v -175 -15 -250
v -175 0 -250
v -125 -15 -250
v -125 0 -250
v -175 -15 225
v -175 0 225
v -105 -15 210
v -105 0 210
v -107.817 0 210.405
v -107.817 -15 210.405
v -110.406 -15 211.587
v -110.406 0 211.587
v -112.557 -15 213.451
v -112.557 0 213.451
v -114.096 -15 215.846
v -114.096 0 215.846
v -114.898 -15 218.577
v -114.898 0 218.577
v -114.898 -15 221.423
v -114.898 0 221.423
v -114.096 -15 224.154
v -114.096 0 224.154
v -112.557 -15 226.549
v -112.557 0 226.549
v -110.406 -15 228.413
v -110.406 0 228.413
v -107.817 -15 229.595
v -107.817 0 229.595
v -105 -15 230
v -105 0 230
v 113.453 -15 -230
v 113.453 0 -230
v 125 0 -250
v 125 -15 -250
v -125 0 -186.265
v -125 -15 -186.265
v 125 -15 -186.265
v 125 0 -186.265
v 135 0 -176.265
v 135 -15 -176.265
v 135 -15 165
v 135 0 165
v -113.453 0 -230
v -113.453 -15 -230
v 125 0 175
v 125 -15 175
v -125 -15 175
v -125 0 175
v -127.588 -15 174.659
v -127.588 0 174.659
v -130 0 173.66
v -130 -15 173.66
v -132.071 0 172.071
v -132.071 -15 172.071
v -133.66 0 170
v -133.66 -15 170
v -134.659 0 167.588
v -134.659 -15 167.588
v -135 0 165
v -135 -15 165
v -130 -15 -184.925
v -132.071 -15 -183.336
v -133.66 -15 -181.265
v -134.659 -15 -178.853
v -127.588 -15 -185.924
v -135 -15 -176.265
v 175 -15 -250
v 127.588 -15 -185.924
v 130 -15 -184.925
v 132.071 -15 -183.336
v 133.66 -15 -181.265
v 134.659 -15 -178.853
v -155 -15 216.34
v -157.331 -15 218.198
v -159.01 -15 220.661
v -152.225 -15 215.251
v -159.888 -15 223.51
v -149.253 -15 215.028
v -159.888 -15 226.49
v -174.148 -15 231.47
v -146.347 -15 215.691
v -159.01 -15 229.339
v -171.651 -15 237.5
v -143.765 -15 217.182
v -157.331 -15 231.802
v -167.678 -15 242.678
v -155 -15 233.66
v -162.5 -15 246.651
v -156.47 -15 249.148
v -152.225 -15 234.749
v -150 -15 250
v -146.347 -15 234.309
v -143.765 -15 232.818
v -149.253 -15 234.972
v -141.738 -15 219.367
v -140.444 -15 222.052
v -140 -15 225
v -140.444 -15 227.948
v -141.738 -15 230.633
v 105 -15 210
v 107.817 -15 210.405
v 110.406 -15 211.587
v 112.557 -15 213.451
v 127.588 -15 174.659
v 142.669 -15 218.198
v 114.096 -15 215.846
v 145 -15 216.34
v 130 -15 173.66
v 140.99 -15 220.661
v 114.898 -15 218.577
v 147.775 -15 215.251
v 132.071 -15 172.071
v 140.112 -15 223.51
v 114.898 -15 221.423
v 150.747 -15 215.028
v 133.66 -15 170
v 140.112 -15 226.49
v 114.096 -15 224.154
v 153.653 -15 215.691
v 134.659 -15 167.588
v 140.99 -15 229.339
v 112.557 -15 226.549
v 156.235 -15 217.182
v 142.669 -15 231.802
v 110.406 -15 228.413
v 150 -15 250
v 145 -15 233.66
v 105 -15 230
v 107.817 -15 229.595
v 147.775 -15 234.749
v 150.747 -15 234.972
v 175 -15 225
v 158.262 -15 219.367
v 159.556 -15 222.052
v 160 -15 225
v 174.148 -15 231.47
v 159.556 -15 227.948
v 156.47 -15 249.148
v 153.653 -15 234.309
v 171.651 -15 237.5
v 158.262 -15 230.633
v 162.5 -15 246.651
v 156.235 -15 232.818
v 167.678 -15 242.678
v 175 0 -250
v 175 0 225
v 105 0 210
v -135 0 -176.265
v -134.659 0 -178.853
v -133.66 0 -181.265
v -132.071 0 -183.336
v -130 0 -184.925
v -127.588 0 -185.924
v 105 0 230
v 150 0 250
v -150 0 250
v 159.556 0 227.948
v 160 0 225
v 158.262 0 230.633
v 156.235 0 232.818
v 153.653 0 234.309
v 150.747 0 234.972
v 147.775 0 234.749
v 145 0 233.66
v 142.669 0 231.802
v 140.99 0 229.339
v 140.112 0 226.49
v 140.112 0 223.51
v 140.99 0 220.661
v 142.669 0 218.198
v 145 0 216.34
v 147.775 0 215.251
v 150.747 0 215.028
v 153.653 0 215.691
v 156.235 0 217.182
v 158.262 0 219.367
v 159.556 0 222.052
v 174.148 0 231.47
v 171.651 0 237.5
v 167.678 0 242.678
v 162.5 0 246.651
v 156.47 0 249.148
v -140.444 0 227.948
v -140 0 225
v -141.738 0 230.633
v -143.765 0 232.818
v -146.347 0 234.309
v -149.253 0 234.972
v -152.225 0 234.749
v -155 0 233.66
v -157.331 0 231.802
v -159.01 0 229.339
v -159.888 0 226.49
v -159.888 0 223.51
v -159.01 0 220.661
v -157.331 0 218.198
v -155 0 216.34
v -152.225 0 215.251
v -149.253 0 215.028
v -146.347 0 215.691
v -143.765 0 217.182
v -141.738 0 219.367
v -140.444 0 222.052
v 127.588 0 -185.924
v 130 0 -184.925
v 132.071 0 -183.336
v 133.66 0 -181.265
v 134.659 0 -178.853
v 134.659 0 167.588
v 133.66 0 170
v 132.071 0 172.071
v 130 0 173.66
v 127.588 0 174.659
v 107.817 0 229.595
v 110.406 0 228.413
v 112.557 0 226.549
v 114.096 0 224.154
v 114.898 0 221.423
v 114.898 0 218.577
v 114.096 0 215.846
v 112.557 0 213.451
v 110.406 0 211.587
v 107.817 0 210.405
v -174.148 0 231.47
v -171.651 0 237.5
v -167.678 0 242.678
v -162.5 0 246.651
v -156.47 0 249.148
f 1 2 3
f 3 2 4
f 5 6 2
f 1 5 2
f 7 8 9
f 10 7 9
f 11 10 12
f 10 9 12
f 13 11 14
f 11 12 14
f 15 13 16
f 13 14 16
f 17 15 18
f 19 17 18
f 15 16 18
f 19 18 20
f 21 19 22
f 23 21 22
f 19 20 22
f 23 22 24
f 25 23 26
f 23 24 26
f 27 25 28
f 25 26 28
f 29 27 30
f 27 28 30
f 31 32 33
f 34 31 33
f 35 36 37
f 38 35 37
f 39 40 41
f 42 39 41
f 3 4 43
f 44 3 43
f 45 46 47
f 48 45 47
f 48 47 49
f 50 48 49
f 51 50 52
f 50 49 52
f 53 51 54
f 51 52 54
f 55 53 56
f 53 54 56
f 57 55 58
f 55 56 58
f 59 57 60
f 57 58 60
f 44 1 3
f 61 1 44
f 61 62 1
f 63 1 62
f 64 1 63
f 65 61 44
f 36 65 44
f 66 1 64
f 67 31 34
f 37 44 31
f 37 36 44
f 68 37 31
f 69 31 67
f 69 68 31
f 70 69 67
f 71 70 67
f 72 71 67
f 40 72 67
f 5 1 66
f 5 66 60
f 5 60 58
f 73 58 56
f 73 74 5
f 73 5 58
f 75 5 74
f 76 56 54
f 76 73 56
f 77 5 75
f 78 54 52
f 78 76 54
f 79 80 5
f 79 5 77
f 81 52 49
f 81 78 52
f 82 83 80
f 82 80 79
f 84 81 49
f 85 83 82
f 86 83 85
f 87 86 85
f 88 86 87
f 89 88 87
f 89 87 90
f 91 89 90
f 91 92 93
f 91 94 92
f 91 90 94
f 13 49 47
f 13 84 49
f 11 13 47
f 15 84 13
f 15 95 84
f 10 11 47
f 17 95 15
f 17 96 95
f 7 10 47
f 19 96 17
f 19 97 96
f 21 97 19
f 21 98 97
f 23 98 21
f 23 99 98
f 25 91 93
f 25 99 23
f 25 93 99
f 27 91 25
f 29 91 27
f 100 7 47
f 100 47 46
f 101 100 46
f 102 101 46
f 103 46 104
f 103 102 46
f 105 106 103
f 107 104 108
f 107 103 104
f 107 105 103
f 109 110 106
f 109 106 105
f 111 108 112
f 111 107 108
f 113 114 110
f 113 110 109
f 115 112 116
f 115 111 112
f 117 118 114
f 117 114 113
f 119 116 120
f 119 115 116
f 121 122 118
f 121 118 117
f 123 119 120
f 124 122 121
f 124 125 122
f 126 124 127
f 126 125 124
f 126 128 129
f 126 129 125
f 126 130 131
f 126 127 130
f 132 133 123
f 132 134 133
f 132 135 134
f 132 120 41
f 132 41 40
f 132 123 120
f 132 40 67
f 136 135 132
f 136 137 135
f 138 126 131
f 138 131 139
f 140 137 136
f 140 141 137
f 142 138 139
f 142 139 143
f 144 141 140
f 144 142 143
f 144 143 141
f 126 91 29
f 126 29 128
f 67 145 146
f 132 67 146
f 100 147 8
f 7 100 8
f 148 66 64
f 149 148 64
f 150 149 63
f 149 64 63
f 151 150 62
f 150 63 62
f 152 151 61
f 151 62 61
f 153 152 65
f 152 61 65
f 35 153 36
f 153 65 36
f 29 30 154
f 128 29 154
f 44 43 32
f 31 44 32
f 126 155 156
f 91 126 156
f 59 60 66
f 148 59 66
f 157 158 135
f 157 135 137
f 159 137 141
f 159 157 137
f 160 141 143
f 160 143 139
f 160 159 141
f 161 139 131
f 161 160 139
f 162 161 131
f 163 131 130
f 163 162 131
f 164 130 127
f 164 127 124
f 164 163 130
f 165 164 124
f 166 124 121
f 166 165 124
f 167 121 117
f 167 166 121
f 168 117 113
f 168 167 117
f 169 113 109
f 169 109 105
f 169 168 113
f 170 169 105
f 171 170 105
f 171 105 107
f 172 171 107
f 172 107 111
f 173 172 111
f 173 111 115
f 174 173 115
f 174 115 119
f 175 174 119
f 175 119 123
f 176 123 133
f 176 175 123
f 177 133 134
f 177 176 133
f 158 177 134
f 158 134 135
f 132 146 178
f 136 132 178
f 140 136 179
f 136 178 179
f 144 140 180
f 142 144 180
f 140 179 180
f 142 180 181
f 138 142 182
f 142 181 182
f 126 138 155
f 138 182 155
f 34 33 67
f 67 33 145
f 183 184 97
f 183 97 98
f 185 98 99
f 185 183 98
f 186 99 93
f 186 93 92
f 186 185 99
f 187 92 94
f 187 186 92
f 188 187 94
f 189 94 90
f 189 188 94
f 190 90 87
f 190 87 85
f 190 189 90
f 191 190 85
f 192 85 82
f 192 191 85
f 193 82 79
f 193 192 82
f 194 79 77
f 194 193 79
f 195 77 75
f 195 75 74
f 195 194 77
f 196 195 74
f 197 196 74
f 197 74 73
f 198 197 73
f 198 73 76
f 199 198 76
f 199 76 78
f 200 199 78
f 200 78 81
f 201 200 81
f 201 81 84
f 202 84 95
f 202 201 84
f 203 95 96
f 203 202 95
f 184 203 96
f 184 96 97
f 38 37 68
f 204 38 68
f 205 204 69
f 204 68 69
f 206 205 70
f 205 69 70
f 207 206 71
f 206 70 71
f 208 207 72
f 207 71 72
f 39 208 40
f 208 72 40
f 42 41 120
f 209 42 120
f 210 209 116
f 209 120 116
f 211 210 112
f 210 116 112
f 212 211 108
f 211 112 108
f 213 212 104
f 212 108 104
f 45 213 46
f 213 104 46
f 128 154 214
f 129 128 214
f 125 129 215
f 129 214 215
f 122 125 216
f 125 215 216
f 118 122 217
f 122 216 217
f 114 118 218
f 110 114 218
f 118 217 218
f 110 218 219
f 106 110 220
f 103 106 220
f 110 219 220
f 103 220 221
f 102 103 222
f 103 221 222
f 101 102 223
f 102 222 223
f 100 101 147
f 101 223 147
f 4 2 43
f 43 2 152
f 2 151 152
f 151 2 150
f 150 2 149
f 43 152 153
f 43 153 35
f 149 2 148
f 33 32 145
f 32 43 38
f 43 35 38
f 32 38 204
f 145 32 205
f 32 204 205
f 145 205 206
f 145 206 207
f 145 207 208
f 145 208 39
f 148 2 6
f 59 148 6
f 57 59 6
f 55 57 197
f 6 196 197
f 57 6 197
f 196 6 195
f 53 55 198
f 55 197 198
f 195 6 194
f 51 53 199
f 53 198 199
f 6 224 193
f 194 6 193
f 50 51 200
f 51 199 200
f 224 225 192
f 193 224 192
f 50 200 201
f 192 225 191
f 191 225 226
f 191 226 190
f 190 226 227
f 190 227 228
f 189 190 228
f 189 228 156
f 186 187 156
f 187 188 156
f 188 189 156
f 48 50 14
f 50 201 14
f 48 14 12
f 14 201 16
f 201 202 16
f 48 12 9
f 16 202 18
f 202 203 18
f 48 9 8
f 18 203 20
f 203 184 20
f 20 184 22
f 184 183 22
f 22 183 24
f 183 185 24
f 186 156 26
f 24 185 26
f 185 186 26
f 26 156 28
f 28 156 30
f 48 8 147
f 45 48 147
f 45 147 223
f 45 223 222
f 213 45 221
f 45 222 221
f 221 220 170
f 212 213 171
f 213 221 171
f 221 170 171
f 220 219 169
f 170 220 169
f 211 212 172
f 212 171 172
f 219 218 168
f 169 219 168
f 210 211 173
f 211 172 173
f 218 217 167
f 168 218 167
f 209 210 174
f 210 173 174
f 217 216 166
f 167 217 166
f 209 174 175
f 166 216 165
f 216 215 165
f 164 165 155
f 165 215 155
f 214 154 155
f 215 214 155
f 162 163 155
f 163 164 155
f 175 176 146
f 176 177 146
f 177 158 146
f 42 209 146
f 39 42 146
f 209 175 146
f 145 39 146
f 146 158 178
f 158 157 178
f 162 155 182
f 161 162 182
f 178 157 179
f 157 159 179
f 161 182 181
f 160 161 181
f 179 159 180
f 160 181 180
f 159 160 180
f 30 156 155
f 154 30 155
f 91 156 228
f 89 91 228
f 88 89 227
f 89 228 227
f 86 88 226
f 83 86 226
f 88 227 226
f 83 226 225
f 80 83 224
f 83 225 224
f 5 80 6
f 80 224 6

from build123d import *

# Parameters (mm, degrees)
F0_R     = 10
F1_DEPTH = 15
F3_DEPTH = 15.001


with BuildPart() as f1:
    # F0 (on Front) → F1 (new body)
    with BuildSketch(Plane.XZ):
        with BuildLine():
            Line((150, 250), (-150, 250))
            ThreePointArc((-150, 250), (-167.67767, 242.67767), (-175, 225))
            Line((-175, 225), (-175, -250))
            Line((-175, -250), (-125, -250))
            Line((-125, -250), (-113.452995, -230))
            Line((-113.452995, -230), (0, -230))
            Line((0, -230), (113.452995, -230))
            Line((113.452995, -230), (125, -250))
            Line((125, -250), (175, -250))
            Line((175, -250), (175, 225))
            ThreePointArc((175, 225), (167.67767, 242.67767), (150, 250))
        make_face()
        with Locations((-150, 225)):
            Circle(F0_R, mode=Mode.SUBTRACT)
        with BuildLine():
            Line((105, 210), (-105, 210))
            ThreePointArc((-105, 210), (-115, 220), (-105, 230))
            Line((-105, 230), (105, 230))
            ThreePointArc((105, 230), (115, 220), (105, 210))
        make_face(mode=Mode.SUBTRACT)
        with Locations((150, 225)):
            Circle(F0_R, mode=Mode.SUBTRACT)
    extrude(amount=F1_DEPTH)

    # F2 (on face) → F3 (cut, through all)
    with BuildSketch(Plane.XZ.offset(15)):
        with BuildLine():
            ThreePointArc((135, 165), (132.071068, 172.071068), (125, 175))
            Line((125, 175), (-125, 175))
            ThreePointArc((-125, 175), (-132.071068, 172.071068), (-135, 165))
            Line((-135, 165), (-135, -176.264953))
            ThreePointArc((-135, -176.264953), (-132.071068, -183.336021), (-125, -186.264953))
            Line((-125, -186.264953), (125, -186.264953))
            ThreePointArc((125, -186.264953), (132.071068, -183.336021), (135, -176.264953))
            Line((135, -176.264953), (135, 165))
        make_face()
    extrude(amount=-F3_DEPTH, mode=Mode.SUBTRACT)


solid = f1.part
